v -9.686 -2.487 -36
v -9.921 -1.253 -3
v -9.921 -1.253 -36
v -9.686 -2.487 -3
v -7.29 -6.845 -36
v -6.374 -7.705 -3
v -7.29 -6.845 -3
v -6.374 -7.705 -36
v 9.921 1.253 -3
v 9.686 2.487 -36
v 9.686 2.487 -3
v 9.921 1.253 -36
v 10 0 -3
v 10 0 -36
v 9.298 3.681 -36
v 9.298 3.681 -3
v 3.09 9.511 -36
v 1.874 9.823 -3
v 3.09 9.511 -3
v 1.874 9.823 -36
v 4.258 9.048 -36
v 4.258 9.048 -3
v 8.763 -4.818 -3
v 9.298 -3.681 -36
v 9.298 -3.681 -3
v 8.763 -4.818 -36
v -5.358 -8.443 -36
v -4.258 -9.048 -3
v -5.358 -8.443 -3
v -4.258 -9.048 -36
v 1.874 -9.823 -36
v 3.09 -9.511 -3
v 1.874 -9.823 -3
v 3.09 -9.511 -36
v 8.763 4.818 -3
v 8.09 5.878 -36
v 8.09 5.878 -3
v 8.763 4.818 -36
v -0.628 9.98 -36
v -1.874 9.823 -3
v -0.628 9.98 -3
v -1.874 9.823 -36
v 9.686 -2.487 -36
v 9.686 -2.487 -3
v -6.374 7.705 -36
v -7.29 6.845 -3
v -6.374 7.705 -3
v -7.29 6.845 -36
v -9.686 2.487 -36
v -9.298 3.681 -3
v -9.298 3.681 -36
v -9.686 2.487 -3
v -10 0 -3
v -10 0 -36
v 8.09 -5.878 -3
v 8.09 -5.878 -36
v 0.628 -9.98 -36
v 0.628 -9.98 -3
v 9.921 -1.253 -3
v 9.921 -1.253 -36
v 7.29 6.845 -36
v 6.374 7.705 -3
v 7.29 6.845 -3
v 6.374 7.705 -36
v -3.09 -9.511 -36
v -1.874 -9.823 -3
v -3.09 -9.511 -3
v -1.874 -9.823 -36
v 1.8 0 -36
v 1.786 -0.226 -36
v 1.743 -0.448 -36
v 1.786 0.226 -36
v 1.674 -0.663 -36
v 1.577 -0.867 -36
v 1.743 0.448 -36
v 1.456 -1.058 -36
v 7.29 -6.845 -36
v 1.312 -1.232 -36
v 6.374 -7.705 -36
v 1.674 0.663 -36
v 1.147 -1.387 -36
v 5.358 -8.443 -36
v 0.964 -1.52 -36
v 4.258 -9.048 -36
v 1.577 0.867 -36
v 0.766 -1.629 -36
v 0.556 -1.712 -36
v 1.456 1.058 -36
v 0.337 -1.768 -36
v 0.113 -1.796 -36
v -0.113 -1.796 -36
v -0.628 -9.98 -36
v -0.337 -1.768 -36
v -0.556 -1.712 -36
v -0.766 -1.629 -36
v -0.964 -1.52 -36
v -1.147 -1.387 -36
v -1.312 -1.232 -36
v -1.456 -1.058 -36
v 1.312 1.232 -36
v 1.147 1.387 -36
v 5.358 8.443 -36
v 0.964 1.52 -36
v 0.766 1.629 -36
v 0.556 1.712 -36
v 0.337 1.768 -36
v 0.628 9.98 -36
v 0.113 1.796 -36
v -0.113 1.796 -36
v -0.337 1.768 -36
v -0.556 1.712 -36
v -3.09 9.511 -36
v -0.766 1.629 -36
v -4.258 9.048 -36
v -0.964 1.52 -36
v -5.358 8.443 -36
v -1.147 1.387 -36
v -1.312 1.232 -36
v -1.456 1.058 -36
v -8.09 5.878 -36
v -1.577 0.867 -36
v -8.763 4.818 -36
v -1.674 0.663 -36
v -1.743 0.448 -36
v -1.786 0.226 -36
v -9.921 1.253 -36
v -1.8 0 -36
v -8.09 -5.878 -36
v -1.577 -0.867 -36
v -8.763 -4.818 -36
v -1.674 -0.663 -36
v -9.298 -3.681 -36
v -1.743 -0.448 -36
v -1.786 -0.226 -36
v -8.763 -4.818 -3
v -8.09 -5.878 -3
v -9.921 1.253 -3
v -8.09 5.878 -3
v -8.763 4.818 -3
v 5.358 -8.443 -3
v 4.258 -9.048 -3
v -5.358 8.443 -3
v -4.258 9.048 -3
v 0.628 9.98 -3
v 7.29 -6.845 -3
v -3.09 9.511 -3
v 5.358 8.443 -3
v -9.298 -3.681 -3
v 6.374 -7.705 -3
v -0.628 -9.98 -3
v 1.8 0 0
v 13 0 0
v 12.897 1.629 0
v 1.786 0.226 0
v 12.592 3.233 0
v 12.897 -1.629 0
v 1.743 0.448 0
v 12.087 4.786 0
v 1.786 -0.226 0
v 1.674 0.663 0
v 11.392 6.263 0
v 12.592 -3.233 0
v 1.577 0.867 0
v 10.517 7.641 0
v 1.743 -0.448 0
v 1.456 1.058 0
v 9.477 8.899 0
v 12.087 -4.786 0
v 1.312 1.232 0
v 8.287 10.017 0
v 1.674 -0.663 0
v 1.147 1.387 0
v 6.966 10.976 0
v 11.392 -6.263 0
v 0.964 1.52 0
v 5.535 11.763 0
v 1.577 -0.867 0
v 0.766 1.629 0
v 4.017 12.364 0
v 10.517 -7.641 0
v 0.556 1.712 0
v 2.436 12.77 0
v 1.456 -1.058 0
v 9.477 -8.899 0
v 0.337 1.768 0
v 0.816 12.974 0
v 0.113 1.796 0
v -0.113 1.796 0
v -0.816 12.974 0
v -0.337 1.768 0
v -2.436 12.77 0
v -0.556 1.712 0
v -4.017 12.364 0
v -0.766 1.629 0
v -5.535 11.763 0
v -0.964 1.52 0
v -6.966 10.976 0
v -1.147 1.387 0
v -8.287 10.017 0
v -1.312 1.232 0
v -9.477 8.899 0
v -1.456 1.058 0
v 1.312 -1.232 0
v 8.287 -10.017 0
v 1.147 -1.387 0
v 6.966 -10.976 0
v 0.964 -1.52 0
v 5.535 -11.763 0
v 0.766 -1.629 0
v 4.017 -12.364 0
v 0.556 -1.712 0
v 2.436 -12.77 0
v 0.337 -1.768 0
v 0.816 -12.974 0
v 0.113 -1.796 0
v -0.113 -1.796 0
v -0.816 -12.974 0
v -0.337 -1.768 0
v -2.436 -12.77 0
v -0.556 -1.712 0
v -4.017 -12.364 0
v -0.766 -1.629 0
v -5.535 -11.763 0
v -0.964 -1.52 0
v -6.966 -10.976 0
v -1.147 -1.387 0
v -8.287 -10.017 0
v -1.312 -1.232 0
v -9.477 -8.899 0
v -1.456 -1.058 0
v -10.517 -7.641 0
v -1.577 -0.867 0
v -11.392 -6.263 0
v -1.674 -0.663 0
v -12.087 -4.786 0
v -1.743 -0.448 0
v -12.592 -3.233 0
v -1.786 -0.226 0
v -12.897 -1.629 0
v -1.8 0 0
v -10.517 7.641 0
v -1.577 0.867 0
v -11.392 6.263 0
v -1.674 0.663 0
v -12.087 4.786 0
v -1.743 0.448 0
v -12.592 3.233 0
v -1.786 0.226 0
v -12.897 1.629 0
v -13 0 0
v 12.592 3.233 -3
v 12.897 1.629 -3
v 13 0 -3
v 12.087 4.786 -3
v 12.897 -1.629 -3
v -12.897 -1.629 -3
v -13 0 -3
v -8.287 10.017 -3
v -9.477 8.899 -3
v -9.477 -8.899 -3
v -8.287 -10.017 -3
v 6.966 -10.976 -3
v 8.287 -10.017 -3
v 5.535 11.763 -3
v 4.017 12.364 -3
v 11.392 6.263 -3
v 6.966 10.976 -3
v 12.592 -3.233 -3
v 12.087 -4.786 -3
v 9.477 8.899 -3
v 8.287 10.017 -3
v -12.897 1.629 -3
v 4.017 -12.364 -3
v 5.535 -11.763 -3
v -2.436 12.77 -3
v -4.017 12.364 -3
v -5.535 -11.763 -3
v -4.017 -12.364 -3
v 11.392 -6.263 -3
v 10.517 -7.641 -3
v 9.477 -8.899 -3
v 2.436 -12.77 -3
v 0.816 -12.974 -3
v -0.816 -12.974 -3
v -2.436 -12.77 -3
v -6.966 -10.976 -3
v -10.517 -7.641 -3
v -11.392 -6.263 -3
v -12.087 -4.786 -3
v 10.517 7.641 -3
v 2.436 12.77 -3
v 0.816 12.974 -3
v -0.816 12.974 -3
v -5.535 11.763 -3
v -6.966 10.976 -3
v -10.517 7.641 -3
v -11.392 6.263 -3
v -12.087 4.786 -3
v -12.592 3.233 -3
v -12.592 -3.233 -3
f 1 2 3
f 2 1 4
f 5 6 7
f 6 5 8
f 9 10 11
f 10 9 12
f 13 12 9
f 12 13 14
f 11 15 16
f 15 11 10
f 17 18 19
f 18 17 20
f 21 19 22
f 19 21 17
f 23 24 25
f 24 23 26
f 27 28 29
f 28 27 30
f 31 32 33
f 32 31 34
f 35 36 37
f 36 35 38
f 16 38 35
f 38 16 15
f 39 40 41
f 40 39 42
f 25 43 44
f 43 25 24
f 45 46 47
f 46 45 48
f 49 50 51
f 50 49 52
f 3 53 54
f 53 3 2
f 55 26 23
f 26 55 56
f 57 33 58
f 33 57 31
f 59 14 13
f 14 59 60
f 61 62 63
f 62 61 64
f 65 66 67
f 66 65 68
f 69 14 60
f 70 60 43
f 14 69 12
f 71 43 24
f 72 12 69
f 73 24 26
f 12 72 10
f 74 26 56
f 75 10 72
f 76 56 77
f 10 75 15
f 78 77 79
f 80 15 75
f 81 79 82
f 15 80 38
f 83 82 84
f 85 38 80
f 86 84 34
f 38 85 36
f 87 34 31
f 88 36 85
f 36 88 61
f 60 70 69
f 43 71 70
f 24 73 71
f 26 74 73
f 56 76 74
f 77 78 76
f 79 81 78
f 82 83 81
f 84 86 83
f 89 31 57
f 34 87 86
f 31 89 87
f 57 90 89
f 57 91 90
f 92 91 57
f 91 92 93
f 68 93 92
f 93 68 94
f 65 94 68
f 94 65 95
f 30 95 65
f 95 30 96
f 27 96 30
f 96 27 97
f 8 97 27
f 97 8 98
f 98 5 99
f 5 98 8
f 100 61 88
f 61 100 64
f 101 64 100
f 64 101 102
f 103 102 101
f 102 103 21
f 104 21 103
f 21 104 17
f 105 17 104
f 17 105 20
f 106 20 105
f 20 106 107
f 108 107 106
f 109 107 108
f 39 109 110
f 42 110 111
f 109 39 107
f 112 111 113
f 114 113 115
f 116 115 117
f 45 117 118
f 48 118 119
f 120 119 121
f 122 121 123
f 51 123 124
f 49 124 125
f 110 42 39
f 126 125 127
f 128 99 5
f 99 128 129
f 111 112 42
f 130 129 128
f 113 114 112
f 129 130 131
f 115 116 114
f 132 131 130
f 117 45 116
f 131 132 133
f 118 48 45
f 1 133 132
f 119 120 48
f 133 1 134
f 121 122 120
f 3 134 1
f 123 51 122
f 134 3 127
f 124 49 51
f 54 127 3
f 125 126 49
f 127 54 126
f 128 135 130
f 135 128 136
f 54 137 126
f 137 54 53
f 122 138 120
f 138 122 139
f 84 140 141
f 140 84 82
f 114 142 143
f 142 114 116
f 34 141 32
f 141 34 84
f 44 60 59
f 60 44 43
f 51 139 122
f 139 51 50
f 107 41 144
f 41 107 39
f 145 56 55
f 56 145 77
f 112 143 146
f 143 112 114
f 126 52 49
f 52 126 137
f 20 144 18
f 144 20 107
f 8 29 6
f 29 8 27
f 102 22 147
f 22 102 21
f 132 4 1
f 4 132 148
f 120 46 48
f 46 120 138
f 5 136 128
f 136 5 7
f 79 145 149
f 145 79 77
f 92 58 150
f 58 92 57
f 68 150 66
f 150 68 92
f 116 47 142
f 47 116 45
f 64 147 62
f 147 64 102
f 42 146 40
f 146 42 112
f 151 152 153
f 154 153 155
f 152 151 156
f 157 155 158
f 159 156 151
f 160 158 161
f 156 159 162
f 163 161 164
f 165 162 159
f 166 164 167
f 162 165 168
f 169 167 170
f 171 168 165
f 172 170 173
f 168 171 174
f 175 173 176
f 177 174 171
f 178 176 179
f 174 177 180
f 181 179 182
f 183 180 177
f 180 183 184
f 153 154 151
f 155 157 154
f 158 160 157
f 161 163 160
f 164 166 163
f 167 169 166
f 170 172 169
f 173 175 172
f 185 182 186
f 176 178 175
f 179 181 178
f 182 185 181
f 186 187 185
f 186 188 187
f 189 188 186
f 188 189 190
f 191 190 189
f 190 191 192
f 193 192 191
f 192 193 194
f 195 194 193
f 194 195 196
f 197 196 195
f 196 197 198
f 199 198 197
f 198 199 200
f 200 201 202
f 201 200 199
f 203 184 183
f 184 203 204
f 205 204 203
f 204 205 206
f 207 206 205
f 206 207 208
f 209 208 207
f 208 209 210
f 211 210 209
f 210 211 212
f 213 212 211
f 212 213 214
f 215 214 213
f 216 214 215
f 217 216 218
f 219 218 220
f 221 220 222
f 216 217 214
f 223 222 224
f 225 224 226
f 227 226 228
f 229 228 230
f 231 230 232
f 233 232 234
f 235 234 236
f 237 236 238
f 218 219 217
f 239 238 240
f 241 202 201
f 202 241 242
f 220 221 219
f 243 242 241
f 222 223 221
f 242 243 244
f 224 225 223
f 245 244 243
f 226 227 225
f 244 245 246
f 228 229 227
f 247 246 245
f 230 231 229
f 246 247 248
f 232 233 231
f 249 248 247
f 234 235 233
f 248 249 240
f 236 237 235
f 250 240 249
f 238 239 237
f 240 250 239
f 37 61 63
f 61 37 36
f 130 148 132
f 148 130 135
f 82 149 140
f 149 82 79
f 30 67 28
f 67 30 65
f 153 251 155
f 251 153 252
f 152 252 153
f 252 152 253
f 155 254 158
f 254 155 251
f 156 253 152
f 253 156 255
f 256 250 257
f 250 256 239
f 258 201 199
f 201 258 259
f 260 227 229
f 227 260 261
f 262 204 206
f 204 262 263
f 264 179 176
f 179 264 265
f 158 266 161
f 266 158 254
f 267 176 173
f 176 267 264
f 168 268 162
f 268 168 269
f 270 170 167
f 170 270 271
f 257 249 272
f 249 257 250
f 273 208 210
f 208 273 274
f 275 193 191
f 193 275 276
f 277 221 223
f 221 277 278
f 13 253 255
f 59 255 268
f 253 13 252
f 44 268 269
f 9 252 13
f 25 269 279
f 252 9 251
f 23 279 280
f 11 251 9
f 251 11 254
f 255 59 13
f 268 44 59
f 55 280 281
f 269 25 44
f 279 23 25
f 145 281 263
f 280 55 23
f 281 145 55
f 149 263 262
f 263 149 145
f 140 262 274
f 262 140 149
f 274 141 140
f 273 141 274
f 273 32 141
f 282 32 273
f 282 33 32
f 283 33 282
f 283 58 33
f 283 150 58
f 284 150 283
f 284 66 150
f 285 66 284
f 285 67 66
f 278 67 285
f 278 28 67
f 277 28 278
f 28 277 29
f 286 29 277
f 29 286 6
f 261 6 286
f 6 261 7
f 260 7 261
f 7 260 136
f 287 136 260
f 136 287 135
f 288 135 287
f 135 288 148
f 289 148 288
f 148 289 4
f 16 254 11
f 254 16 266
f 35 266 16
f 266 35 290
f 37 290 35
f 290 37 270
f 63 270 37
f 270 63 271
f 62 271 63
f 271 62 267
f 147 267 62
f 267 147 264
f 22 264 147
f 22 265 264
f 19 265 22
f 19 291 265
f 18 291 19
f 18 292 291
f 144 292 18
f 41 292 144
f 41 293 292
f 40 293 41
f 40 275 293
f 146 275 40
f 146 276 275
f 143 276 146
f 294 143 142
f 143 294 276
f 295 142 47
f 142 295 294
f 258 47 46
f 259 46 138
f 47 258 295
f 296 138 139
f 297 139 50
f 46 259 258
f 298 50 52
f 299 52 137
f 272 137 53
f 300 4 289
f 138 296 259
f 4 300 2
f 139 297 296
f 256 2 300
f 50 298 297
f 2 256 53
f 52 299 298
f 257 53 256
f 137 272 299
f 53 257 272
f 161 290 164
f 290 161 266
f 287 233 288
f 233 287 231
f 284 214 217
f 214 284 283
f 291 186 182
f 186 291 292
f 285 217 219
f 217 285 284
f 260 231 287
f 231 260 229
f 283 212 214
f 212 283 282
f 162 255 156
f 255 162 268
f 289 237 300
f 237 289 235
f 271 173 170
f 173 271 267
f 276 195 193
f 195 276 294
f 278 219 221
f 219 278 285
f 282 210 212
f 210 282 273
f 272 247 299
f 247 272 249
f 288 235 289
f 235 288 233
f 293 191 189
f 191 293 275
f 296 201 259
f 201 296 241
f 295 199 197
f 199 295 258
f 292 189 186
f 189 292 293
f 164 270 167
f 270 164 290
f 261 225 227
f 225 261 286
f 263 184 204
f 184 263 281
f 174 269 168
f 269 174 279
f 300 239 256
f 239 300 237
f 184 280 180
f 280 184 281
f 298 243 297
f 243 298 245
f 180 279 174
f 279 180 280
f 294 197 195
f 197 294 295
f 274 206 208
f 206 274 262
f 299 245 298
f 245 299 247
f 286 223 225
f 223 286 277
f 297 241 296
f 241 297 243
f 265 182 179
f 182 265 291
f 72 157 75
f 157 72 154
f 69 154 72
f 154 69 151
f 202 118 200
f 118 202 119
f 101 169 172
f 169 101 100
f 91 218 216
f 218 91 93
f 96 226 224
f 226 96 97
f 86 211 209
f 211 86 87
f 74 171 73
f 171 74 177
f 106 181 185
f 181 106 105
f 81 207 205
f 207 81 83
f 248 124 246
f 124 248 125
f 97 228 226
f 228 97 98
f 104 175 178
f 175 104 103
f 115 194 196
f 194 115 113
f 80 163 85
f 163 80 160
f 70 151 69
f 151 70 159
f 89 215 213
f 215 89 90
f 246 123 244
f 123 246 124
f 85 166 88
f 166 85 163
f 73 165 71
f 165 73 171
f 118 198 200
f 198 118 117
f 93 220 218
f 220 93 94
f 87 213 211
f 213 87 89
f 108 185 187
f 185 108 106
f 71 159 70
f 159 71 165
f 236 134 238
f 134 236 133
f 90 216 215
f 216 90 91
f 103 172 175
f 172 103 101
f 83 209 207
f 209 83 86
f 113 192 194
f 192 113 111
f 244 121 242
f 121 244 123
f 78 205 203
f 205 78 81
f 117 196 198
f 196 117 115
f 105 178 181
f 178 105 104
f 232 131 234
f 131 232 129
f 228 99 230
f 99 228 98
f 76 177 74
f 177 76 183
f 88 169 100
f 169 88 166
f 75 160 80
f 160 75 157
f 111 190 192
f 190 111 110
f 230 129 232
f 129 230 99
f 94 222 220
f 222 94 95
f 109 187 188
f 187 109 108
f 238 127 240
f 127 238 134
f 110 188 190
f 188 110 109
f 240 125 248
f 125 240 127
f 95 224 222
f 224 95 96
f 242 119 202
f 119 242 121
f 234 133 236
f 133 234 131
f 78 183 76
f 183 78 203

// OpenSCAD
$fn = 50;


difference() {
	union() {
		translate(v = [0, 0, -36.0000000000]) {
			cylinder(h = 36, r = 10.0000000000);
		}
		translate(v = [0, 0, -3.0000000000]) {
			cylinder(h = 3, r = 13.0000000000);
		}
	}
	union() {
		#translate(v = [0, 0, -36]) {
			cylinder(h = 36, r = 1.8000000000);
		}
	}
}
